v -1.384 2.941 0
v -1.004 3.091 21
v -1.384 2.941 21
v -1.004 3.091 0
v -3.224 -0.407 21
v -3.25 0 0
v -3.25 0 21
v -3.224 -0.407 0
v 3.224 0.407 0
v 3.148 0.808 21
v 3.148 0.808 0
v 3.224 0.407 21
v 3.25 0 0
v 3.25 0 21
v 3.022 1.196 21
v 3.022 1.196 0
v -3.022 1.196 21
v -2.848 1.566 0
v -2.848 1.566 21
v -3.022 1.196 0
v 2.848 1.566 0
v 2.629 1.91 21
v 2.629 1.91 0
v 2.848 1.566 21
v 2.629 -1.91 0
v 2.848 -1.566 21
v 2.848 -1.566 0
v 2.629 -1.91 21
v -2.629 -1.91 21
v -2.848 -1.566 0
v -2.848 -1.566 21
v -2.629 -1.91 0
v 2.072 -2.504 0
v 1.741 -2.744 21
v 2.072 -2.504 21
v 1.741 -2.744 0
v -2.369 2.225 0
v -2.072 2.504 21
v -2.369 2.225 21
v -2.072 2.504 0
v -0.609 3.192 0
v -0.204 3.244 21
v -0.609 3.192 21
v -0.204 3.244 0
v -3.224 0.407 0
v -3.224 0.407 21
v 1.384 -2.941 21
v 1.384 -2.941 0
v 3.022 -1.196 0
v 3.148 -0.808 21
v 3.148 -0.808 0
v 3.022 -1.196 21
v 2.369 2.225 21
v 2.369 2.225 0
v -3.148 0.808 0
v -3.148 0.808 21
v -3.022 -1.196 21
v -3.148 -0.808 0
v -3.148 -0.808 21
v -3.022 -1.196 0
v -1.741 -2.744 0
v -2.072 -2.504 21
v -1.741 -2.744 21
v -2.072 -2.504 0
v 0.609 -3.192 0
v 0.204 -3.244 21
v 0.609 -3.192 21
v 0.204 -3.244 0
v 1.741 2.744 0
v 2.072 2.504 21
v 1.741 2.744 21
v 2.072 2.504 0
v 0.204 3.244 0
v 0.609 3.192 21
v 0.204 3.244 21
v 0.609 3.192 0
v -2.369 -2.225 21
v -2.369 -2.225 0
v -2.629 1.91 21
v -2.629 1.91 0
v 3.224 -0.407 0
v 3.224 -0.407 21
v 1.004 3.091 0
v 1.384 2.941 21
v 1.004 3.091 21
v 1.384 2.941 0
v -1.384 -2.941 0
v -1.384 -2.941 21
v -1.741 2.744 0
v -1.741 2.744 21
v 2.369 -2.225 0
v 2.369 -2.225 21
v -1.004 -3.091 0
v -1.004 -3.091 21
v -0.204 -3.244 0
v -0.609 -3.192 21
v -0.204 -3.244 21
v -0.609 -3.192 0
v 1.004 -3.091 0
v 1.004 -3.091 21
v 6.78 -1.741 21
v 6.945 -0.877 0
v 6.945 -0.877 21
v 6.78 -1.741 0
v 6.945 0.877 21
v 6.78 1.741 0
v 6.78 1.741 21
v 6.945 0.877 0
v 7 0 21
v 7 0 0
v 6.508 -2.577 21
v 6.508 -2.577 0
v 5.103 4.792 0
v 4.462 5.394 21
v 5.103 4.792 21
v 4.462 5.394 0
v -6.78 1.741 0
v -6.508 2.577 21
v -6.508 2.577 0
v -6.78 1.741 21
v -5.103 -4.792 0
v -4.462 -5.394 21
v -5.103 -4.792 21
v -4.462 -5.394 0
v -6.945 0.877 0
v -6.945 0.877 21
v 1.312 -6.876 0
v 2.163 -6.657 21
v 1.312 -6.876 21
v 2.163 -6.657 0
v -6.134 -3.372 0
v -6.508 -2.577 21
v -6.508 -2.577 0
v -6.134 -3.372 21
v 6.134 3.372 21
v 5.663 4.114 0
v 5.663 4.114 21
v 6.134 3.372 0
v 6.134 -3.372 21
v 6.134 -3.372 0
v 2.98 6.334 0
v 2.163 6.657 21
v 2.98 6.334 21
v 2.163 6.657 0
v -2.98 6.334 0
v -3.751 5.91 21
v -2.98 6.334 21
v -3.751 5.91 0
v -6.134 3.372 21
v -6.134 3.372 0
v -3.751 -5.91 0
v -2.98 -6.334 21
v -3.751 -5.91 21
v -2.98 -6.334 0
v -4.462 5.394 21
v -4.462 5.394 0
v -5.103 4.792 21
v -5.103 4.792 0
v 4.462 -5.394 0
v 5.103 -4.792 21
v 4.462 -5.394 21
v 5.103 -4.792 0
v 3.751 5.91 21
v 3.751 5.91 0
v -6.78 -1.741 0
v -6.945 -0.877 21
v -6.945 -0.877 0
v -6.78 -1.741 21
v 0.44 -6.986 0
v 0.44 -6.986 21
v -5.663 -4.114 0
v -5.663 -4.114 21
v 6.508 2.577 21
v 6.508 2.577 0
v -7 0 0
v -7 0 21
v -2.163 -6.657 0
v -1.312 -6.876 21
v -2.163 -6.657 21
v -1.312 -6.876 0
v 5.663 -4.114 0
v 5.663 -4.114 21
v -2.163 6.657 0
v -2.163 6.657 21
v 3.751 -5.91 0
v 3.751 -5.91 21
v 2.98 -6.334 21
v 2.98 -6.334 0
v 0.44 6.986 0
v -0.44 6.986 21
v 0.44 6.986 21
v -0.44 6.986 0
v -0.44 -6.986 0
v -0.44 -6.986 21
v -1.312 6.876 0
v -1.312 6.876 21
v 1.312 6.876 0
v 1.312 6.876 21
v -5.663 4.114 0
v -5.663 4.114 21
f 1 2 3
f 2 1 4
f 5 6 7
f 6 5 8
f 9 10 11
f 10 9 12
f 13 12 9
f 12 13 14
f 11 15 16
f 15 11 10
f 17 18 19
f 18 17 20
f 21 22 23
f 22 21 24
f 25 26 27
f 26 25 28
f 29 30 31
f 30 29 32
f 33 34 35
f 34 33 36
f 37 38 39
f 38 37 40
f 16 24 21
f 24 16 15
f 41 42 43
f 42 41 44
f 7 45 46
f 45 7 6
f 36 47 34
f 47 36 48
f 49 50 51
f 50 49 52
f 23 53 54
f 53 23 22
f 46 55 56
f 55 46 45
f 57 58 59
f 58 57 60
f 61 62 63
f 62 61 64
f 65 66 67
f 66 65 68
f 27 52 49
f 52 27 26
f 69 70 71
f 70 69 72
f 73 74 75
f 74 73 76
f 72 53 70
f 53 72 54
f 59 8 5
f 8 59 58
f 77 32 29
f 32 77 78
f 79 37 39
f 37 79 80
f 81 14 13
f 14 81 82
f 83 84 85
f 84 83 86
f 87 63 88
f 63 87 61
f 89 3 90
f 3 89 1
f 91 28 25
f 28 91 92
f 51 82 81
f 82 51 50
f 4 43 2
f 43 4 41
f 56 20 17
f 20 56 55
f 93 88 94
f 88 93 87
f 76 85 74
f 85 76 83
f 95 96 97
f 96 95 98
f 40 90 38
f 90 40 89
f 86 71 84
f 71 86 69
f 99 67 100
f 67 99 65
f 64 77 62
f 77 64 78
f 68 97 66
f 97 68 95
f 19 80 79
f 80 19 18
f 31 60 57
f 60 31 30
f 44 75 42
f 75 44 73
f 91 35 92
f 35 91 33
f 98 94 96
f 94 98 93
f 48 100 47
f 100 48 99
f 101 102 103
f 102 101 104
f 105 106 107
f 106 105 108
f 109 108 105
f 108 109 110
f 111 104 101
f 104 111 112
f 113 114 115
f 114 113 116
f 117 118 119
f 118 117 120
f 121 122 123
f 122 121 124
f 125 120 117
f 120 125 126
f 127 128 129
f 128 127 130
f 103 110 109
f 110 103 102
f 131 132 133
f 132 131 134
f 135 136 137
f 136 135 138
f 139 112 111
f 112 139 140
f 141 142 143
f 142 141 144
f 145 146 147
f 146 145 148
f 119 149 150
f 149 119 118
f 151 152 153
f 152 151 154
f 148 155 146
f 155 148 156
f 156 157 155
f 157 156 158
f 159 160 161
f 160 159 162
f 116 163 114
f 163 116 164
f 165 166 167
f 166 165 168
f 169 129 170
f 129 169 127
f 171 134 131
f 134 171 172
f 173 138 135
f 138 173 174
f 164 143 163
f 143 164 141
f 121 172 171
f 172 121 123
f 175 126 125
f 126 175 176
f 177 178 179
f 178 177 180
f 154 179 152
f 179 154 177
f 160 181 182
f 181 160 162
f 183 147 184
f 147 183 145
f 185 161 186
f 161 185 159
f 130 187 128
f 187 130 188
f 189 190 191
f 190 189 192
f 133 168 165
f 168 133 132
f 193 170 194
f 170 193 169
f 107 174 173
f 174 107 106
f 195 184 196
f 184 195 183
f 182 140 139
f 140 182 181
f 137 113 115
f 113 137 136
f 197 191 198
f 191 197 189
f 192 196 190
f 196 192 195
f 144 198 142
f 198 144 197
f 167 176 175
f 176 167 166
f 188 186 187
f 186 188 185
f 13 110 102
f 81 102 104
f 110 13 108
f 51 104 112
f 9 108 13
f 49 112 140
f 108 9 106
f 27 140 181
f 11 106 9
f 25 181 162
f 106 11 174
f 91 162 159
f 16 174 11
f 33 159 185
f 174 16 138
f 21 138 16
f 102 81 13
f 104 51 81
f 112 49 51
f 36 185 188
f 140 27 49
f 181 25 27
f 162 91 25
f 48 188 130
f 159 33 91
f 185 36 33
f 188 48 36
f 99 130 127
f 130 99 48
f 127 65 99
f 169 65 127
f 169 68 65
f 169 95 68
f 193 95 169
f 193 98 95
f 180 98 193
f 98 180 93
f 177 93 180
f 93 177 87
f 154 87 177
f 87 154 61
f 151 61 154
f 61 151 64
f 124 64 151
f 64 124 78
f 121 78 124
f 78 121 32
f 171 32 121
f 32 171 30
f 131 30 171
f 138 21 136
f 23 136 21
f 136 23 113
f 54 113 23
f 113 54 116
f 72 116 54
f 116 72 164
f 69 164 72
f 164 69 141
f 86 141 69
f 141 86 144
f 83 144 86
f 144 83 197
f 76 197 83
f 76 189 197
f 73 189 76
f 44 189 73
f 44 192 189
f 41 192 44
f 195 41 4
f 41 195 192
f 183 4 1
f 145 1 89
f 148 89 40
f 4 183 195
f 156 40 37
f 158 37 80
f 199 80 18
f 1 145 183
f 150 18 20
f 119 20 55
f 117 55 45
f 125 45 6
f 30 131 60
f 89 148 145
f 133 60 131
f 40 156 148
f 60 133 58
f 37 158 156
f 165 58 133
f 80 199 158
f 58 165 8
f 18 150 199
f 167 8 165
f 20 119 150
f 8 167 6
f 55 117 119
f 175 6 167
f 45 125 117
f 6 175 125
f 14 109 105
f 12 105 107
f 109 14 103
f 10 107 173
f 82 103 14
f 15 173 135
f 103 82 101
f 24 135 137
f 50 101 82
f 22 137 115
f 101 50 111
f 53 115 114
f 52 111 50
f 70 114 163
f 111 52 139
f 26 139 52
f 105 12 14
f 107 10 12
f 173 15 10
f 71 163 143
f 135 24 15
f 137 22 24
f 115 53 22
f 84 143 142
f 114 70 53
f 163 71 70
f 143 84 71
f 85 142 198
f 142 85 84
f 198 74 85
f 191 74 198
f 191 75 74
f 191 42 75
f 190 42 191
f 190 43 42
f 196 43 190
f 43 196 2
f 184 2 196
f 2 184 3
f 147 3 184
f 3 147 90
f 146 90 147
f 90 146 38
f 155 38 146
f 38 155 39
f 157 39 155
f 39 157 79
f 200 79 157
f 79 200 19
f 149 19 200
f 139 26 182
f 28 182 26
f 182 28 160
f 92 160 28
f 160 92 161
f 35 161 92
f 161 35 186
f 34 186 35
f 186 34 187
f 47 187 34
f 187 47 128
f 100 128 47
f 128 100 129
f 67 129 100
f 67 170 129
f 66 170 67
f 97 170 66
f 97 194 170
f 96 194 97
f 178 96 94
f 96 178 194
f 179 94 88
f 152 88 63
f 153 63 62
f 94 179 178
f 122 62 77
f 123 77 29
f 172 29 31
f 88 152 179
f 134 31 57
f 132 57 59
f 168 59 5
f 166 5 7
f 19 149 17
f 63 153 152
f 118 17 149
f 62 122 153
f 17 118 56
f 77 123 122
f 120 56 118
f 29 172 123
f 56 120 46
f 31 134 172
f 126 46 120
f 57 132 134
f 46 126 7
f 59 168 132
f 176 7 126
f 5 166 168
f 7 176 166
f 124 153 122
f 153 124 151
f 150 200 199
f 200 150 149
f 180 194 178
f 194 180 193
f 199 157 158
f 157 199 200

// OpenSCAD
$fn = 50;


difference() {
	union() {
		*color(alpha = 1.0000000000, c = "gray") {
			translate(v = [0, 7, 0]) {
				linear_extrude(height = 1) {
					text(font = "Arial:style=Bold", halign = "center", size = 4.5000000000, text = "COMMENT plate main", valign = "center");
				}
			}
		}
		*color(alpha = 1.0000000000, c = "gray") {
			translate(v = [0, 14, 0]) {
				linear_extrude(height = 1) {
					text(font = "Arial:style=Bold", halign = "center", size = 4.5000000000, text = "COMMENT description oobb_plate_shape_p_type_21_depth_1_width_1_height_21_thickness_true_both_holes", valign = "center");
				}
			}
		}
		cylinder(h = 21, r = 7.0000000000);
	}
	union() {
		*color(alpha = 1.0000000000, c = "gray") {
			translate(v = [0, 7, 0]) {
				linear_extrude(height = 1) {
					text(font = "Arial:style=Bold", halign = "center", size = 4.5000000000, text = "COMMENT holes main", valign = "center");
				}
			}
		}
		*color(alpha = 1.0000000000, c = "gray") {
			translate(v = [0, 14, 0]) {
				linear_extrude(height = 1) {
					text(font = "Arial:style=Bold", halign = "center", size = 4.5000000000, text = "COMMENT description oobb_holes_shape_n_type_1_width_1_height_21_thickness_true_both_holes", valign = "center");
				}
			}
		}
		translate(v = [0, 0, -50]) {
			cylinder(h = 100, r = 3.2500000000);
		}
		translate(v = [0, 0, -50]) {
			cylinder(h = 100, r = 1.8000000000);
		}
	}
}
